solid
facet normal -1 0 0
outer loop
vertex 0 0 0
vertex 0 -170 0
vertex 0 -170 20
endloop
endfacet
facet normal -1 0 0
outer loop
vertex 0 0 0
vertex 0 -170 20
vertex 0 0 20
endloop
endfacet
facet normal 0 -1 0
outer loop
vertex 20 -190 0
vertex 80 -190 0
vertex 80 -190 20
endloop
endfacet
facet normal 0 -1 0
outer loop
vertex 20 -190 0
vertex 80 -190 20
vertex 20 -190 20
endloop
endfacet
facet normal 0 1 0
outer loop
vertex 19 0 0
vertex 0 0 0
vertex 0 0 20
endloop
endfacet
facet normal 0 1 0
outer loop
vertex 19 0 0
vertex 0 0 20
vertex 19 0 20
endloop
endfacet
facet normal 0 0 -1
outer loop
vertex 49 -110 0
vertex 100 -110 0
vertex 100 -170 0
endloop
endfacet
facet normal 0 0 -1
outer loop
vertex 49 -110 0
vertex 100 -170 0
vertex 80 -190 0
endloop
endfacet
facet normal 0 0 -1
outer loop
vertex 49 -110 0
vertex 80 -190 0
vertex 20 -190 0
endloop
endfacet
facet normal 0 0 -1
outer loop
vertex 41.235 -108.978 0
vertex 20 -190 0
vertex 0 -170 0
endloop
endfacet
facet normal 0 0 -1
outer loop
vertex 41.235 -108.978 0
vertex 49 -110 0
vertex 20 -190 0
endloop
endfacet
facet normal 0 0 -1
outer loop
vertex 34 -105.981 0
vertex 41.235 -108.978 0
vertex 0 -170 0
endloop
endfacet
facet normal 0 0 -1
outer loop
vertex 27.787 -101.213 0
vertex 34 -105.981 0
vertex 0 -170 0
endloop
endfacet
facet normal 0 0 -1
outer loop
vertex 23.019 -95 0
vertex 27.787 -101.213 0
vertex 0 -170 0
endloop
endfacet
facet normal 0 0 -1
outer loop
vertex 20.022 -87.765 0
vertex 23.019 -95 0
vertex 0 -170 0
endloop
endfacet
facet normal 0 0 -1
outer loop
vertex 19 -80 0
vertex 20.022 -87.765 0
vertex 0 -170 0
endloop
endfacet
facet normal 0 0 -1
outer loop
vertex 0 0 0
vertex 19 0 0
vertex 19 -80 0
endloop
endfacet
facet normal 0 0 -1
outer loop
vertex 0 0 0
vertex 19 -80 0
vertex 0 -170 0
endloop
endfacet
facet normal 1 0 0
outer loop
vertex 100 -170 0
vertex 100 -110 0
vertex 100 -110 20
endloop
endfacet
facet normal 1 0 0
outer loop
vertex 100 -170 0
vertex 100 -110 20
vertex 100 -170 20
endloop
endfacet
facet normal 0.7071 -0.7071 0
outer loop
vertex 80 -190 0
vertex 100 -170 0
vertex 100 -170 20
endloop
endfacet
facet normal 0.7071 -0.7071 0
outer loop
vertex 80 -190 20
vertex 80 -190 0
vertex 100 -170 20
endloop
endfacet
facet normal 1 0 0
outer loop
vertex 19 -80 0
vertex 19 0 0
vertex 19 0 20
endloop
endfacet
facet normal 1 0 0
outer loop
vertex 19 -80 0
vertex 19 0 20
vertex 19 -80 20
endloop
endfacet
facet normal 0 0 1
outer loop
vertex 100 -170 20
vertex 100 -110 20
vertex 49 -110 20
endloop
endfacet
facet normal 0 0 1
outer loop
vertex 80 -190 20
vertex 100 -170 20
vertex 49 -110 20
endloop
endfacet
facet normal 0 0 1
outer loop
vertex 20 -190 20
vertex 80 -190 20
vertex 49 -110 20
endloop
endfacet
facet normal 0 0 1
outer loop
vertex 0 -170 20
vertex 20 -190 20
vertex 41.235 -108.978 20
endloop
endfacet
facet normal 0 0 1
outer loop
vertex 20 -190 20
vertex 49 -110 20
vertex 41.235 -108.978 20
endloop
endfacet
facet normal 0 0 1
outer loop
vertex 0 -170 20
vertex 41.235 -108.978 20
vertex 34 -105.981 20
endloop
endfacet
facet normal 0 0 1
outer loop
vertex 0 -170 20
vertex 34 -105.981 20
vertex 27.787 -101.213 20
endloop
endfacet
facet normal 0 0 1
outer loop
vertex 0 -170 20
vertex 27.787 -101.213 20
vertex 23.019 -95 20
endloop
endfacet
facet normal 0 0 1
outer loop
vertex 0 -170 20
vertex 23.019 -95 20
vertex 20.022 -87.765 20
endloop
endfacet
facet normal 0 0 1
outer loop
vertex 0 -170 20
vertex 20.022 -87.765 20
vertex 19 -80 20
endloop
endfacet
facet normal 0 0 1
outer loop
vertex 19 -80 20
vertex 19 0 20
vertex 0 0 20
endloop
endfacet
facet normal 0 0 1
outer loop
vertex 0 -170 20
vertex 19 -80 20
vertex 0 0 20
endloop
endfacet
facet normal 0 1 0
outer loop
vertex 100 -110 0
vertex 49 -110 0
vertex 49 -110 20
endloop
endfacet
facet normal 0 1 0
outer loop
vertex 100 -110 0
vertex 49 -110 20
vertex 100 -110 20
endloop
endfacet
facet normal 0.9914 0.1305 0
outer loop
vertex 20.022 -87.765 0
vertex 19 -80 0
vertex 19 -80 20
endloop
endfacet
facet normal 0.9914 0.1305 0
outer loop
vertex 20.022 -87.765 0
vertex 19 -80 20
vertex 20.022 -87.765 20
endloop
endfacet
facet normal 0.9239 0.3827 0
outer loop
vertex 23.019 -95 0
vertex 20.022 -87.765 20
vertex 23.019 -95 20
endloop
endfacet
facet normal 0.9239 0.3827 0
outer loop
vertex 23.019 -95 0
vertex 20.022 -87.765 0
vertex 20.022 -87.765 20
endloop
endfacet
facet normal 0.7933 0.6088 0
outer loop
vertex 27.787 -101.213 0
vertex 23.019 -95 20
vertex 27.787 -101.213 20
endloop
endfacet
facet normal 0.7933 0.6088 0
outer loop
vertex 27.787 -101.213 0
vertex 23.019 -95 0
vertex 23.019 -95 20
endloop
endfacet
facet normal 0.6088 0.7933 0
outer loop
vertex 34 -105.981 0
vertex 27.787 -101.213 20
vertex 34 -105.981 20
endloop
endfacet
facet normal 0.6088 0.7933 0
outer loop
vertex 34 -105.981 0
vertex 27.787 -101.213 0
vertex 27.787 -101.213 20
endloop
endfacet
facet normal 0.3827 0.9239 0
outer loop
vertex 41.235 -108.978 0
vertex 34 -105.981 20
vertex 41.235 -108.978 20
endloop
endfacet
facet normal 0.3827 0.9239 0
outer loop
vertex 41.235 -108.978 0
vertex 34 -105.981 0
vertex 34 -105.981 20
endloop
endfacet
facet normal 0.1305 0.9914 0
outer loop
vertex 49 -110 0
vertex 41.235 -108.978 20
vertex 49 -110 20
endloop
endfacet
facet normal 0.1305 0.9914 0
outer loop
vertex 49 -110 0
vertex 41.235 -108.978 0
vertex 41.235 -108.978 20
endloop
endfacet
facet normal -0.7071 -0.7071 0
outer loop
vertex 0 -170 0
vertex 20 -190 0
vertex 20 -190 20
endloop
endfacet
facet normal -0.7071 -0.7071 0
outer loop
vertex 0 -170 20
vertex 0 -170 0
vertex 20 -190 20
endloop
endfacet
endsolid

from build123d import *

# Parameters (mm, degrees)
EXTRUDE_1_DEPTH = 20
CHAMFER_1_SIZE  = 20


with BuildPart() as part:
    # 草图1 → 凸台-拉伸1 (new body)
    with BuildSketch(Plane.XY):
        with BuildLine():
            Line((0, 0), (19, 0))
            Line((19, 0), (19, -80))
            ThreePointArc((19, -80), (27.786796564, -101.213203436), (49, -110))
            Line((49, -110), (100, -110))
            Line((100, -110), (100, -190))
            Line((100, -190), (0, -190))
            Line((0, -190), (0, 0))
        make_face()
    extrude(amount=EXTRUDE_1_DEPTH)

    # 倒角1
    chamfer_1_edges = [part.edges().sort_by_distance(p)[0] for p in [
        (100, -190, 10),
        (0, -190, 10),
    ]]
    chamfer(chamfer_1_edges, length=CHAMFER_1_SIZE)


solid = part.part
